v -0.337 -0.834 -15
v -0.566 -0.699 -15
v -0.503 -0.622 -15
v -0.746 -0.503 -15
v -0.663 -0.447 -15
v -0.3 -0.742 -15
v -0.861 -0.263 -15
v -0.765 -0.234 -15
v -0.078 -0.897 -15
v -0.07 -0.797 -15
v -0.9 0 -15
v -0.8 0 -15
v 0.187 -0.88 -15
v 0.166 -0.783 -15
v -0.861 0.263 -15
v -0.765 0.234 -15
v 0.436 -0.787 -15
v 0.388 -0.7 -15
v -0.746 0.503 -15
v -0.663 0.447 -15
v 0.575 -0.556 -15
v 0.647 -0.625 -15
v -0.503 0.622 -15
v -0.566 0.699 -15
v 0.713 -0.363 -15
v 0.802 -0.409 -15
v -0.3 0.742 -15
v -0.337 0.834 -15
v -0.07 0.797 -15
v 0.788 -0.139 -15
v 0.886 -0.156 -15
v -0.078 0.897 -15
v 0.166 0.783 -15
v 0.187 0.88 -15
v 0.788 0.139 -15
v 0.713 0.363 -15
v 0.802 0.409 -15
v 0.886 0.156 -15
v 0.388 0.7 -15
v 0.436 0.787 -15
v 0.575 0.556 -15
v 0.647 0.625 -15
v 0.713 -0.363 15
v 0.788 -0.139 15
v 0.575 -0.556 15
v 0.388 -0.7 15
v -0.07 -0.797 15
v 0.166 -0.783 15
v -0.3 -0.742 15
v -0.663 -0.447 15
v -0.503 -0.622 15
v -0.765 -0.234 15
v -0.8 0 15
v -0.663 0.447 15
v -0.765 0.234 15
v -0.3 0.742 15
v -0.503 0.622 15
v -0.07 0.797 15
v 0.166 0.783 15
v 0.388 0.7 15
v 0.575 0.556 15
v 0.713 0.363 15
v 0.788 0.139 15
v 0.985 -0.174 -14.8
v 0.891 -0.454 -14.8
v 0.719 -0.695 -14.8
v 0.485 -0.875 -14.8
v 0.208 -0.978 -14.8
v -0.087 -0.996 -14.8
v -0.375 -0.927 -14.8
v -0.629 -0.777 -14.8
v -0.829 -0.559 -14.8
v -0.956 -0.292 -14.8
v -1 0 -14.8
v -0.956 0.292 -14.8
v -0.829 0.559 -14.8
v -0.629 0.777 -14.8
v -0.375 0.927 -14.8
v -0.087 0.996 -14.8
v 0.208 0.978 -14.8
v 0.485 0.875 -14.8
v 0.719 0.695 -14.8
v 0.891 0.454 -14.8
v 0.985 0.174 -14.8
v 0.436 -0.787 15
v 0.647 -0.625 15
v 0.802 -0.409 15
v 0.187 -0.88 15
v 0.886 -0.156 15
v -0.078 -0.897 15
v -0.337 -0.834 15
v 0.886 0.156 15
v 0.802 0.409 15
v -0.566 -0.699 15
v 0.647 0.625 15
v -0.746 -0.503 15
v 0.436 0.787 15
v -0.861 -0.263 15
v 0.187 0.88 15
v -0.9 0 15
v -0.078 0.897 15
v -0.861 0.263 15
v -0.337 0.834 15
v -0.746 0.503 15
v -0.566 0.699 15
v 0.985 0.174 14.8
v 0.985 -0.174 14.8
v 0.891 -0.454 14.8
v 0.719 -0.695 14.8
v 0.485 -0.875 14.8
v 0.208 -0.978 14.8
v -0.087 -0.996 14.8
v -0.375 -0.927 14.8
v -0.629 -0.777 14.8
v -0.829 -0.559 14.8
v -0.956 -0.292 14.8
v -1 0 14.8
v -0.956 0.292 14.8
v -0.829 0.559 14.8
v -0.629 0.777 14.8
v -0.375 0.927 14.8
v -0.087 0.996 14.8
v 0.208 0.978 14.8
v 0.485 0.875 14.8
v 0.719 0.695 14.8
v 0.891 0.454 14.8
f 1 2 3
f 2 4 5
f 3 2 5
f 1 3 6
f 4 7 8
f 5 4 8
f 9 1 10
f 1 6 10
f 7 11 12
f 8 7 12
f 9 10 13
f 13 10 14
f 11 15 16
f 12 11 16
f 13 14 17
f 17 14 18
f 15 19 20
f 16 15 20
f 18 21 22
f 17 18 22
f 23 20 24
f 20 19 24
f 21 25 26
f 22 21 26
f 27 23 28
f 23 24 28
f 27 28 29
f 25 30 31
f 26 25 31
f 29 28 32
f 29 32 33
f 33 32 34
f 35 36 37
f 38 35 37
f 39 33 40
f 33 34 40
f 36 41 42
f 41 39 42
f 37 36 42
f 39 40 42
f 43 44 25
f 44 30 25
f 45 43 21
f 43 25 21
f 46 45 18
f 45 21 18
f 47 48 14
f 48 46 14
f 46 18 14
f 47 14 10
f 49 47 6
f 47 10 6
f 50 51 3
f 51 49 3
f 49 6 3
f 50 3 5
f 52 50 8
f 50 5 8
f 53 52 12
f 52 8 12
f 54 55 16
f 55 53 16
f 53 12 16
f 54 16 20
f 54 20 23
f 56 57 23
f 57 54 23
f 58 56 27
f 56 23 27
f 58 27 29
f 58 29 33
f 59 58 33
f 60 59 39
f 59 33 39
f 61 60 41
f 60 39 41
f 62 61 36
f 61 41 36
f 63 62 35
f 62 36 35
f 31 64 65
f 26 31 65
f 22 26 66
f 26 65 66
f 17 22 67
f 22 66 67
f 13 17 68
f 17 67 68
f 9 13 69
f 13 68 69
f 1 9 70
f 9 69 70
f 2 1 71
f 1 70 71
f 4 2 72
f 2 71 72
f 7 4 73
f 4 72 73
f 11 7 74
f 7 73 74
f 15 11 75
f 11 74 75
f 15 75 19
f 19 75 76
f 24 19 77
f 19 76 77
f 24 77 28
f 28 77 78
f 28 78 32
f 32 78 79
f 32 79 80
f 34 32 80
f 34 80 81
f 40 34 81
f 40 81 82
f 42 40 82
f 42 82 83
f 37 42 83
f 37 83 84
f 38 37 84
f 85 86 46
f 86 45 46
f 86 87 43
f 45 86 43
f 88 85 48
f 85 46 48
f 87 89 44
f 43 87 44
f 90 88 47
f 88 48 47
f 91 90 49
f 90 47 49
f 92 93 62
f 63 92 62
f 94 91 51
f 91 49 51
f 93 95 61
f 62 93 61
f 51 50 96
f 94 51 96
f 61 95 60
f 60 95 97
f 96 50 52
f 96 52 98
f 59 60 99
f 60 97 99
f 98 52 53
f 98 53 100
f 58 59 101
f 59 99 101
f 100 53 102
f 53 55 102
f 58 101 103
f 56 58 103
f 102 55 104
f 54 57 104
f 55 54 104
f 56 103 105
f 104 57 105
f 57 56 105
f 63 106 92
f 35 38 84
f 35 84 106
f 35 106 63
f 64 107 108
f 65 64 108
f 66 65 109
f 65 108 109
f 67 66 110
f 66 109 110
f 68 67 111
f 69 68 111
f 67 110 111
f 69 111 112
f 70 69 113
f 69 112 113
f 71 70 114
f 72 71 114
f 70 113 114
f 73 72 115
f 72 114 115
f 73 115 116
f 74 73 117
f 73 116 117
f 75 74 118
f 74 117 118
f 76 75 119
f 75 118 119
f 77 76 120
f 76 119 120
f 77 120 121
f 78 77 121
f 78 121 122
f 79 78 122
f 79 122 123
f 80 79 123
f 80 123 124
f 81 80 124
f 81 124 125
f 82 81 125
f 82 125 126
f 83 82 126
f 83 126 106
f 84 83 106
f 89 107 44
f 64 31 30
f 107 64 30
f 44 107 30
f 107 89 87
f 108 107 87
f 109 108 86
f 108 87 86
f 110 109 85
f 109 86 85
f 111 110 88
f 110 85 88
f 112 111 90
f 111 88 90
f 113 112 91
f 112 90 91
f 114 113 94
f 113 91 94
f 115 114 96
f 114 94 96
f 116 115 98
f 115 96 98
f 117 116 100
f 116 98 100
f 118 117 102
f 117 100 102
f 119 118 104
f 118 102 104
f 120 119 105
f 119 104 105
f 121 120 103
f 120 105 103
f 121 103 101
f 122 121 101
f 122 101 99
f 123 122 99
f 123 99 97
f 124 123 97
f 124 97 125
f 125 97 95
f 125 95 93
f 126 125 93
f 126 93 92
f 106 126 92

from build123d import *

# Parameters (mm, degrees)
REVOLVE1_ANGLE = 340


with BuildPart() as part:
    # Sketch2 → Revolve1 (revolve, symmetric)
    with BuildSketch(Plane(origin=(0, 0, 0), x_dir=(1, 0, 0), z_dir=(0, 1, 0))) as revolve1_sk:
        Polygon((-0.8, 15), (-0.9, 15), (-1, 14.8), (-1, -14.8), (-0.9, -15), (-0.8, -15), align=None)
    revolve(axis=Axis((0, 0, -15), (0, 0, 1)), revolution_arc=REVOLVE1_ANGLE / 2)
    revolve(revolve1_sk.sketch, axis=Axis((0, 0, -15), (0, 0, -1)), revolution_arc=REVOLVE1_ANGLE / 2)


solid = part.part
